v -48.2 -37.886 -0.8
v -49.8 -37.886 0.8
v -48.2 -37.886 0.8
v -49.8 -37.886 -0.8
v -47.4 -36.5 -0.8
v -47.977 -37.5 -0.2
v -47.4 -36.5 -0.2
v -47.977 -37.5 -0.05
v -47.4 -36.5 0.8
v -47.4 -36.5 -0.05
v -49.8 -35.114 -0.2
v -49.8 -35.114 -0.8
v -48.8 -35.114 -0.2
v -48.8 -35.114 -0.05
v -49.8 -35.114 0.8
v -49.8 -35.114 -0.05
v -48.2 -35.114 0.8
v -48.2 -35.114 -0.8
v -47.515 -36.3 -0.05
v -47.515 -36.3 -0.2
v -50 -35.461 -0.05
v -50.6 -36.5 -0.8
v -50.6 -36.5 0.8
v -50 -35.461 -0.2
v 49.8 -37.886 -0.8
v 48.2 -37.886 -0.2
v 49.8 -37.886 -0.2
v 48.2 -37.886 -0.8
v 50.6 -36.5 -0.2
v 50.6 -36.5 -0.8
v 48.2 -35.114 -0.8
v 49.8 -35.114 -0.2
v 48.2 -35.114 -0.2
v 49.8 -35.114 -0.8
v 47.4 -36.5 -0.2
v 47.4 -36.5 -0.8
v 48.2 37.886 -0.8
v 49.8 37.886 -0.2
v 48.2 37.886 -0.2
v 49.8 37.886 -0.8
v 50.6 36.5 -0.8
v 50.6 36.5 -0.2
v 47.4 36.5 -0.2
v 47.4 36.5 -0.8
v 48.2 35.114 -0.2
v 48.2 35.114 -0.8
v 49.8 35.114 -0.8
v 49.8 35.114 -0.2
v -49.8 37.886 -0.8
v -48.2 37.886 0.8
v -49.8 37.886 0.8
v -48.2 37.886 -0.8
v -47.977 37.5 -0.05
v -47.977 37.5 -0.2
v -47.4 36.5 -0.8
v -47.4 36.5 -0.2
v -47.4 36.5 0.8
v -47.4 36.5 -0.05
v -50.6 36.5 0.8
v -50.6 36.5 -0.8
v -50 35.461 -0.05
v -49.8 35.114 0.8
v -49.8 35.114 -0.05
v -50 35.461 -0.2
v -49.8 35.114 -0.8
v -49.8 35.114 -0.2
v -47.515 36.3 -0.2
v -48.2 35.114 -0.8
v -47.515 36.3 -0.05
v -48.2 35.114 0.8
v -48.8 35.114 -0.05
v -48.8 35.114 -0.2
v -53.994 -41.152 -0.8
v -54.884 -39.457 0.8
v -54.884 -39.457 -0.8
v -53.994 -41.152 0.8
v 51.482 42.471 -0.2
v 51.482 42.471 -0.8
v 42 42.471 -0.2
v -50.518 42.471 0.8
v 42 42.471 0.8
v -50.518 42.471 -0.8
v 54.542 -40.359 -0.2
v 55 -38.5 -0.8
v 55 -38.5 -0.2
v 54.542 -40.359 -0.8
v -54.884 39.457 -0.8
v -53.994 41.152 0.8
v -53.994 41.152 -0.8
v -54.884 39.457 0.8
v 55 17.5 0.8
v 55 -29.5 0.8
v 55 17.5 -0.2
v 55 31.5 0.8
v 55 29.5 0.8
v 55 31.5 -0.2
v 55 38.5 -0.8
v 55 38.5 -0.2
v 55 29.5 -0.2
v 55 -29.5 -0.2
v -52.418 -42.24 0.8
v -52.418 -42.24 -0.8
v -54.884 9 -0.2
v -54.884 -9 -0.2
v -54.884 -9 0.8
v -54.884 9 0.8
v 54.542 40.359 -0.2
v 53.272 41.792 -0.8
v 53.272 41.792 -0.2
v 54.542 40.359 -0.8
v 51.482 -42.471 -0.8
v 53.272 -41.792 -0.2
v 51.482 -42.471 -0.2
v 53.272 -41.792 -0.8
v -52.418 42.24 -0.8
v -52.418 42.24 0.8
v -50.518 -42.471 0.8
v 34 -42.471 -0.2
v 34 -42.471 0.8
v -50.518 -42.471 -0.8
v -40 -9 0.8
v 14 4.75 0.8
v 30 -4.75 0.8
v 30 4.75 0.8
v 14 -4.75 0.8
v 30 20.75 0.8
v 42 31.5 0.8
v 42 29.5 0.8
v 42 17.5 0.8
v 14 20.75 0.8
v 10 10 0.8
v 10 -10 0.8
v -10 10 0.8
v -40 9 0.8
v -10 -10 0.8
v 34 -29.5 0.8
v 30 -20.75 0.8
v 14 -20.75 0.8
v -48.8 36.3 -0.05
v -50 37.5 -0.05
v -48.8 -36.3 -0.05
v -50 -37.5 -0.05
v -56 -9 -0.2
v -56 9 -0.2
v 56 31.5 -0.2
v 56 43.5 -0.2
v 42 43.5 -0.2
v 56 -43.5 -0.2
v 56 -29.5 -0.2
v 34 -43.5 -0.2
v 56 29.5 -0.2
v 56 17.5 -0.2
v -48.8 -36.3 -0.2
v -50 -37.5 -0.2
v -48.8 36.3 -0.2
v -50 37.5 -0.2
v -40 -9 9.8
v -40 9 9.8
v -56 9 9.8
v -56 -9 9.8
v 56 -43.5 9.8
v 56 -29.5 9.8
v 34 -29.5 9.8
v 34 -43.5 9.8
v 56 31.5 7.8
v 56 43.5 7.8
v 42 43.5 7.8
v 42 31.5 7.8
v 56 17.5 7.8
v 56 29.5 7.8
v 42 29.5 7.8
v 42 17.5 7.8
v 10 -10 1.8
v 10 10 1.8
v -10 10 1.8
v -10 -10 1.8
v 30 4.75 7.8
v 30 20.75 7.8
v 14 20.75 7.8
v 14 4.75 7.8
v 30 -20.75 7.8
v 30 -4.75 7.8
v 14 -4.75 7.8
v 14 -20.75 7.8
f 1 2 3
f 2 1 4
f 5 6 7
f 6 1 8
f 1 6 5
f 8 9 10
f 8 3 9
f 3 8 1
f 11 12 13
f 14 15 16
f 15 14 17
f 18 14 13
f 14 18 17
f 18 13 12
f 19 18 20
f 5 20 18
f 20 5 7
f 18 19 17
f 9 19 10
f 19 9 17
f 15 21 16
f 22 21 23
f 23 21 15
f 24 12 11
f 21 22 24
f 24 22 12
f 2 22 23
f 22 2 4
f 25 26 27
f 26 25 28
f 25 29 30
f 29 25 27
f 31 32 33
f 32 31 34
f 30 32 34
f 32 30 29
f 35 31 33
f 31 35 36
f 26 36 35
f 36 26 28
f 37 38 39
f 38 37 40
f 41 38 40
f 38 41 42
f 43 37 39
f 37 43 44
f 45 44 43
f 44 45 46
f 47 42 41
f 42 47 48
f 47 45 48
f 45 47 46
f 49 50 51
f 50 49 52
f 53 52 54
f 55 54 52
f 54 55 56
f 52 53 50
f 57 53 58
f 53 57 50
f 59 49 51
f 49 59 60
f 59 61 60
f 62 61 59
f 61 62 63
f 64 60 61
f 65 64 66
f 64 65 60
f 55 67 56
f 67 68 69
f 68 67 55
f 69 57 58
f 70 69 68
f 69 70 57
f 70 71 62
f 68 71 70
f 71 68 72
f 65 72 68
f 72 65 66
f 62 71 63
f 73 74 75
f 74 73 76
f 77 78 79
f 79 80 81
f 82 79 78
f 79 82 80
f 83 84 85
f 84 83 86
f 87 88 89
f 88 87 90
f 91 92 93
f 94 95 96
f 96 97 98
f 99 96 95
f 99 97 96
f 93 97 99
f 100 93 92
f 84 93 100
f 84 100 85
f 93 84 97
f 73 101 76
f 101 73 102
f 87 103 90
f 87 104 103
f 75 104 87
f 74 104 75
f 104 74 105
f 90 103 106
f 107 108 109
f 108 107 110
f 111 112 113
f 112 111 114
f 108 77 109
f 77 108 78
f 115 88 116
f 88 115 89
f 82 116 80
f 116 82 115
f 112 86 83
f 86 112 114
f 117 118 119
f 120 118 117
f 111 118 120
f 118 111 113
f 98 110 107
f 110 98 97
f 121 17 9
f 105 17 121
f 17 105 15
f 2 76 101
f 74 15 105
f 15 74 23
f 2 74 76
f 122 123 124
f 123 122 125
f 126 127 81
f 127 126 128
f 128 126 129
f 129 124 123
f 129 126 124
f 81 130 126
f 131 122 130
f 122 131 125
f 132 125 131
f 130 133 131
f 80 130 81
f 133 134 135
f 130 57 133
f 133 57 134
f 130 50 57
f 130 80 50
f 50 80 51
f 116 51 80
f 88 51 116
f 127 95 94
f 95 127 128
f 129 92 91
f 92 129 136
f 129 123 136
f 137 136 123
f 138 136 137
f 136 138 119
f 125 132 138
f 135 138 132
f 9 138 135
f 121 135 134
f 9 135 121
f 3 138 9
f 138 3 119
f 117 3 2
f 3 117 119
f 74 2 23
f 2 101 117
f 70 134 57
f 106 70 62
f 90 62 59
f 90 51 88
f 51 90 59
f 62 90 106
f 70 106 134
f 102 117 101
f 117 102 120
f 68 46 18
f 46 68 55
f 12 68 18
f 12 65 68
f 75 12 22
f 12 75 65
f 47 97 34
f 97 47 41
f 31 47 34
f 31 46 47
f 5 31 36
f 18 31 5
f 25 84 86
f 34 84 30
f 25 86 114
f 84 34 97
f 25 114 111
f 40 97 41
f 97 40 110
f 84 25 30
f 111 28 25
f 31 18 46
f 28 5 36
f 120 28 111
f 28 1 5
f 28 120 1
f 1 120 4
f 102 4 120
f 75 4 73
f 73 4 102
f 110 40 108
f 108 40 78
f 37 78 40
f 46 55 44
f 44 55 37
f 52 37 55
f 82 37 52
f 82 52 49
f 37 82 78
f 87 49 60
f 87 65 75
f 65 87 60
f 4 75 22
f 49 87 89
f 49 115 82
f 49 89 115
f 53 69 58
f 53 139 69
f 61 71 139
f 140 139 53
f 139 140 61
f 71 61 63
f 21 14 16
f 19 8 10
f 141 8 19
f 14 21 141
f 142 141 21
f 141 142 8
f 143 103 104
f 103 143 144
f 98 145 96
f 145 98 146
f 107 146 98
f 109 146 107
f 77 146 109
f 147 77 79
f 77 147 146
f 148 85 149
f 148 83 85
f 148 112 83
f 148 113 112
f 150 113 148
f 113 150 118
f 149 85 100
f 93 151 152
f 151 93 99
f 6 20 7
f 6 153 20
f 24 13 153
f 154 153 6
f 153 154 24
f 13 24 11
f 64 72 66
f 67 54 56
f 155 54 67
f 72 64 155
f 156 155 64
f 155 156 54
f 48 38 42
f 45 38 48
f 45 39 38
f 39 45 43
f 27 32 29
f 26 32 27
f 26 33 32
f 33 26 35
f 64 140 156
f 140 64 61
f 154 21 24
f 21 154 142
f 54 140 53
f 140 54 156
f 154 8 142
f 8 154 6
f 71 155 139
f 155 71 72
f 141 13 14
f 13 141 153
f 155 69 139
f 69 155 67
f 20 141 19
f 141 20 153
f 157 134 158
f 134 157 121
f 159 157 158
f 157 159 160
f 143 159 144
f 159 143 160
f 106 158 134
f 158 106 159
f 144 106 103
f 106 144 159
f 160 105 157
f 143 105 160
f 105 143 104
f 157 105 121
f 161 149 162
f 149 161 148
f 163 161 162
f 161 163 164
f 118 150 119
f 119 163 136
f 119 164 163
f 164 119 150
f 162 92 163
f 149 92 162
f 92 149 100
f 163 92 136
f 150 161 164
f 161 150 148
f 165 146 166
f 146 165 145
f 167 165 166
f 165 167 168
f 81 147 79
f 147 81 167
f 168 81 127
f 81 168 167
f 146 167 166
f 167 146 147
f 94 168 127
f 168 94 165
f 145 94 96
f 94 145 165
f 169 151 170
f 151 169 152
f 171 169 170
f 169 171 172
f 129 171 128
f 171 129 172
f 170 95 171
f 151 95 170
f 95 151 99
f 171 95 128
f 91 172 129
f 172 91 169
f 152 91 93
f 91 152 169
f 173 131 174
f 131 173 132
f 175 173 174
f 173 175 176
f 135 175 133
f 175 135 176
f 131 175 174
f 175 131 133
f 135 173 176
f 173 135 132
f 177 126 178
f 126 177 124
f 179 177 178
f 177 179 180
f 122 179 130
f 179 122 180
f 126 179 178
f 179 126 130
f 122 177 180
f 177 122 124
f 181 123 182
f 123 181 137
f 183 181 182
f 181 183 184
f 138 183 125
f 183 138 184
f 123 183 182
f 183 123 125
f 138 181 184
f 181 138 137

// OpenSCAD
// Parameters
pcb_length = 110.0; //[55.0:220.0:1]
pcb_width = 85.0; //[42.5:170.0:1]
pcb_thickness = 1.6; //[0.8:3.2:0.1]
corner_radius = 4.0; //[2.0:8.0:0.5]
mount_hole_diameter = 3.2; //[2.0:6.0:0.1]
mount_hole_edge_offset = 6.0; //[3.0:12.0:0.5]
hole_clearance_z = 0.4; //[0.1:1.0:0.1]
overlap = 1.0; //[0.5:2.0:0.1]
silkscreen_thickness = 0.15; //[0.05:0.4:0.05]
silkscreen_margin = 5.0; //[2.0:12.0:0.5]
silkscreen_frame_width = 1.2; //[0.6:3.0:0.1]
connector_height = 10.0; //[5.0:20.0:0.5]
connector_wall = 2.0; //[1.0:4.0:0.5]
heatsink_height = 8.0; //[4.0:16.0:0.5]
chip_height = 2.0; //[1.0:5.0:0.1]

// Base Shapes
module pcb_corner_cyl(pos) {
  translate(pos)
    cylinder(r=corner_radius, h=pcb_thickness, center=true);
}

module mount_hole(pos) {
  translate(pos)
    cylinder(r=mount_hole_diameter/2, h=pcb_thickness + hole_clearance_z, center=true);
}

module silkscreen_outer_plate() {
  translate([0, 0, pcb_thickness/2 + silkscreen_thickness/2 - overlap])
    cube([pcb_length - 2*silkscreen_margin, pcb_width - 2*silkscreen_margin, silkscreen_thickness], center=true);
}

module silkscreen_inner_cut() {
  translate([0, 0, pcb_thickness/2 + silkscreen_thickness/2 - overlap])
    cube([pcb_length - 2*(silkscreen_margin + silkscreen_frame_width), pcb_width - 2*(silkscreen_margin + silkscreen_frame_width), silkscreen_thickness + 2*overlap], center=true);
}

module connector_usb() {
  translate([-pcb_length/2 + (12 + 2*connector_wall)/2 - overlap, 0, pcb_thickness/2 + connector_height/2 - overlap])
    cube([12 + 2*connector_wall, 14 + 2*connector_wall, connector_height], center=true);
}

module connector_power() {
  translate([pcb_length/2 - (18 + 2*connector_wall)/2 + overlap, -pcb_width/2 + (10 + 2*connector_wall)/2 - overlap, pcb_thickness/2 + connector_height/2 - overlap])
    cube([18 + 2*connector_wall, 10 + 2*connector_wall, connector_height], center=true);
}

module connector_stepper(pos) {
  translate(pos)
    cube([10 + 2*connector_wall, 8 + 2*connector_wall, connector_height*0.8], center=true);
}

module chip(pos, size) {
  translate(pos)
    cube(size, center=true);
}

module heatsink(pos) {
  translate(pos)
    cube([16, 16, heatsink_height], center=true);
}

// Operations
module board_corner_radius() {
  hull() {
    pcb_corner_cyl([pcb_length/2 - corner_radius, pcb_width/2 - corner_radius, 0]);
    pcb_corner_cyl([-pcb_length/2 + corner_radius, pcb_width/2 - corner_radius, 0]);
    pcb_corner_cyl([-pcb_length/2 + corner_radius, -pcb_width/2 + corner_radius, 0]);
    pcb_corner_cyl([pcb_length/2 - corner_radius, -pcb_width/2 + corner_radius, 0]);
  }
}

module mounting_holes() {
  union() {
    mount_hole([-pcb_length/2 + mount_hole_edge_offset, -pcb_width/2 + mount_hole_edge_offset, 0]);
    mount_hole([pcb_length/2 - mount_hole_edge_offset, -pcb_width/2 + mount_hole_edge_offset, 0]);
    mount_hole([pcb_length/2 - mount_hole_edge_offset, pcb_width/2 - mount_hole_edge_offset, 0]);
    mount_hole([-pcb_length/2 + mount_hole_edge_offset, pcb_width/2 - mount_hole_edge_offset, 0]);
  }
}

module pcb_main_body() {
  difference() {
    board_corner_radius();
    mounting_holes();
  }
}

module silkscreen_markings() {
  difference() {
    silkscreen_outer_plate();
    silkscreen_inner_cut();
  }
}

module connectors() {
  union() {
    connector_usb();
    connector_power();
    connector_stepper([pcb_length/2 - (10 + 2*connector_wall)/2 + overlap, pcb_width/2 - (8 + 2*connector_wall)/2 + overlap, pcb_thickness/2 + (connector_height*0.8)/2 - overlap]);
    connector_stepper([pcb_length/2 - (10 + 2*connector_wall)/2 + overlap, pcb_width/2 - (8 + 2*connector_wall)/2 - (8 + 2*connector_wall) - overlap, pcb_thickness/2 + (connector_height*0.8)/2 - overlap]);
  }
}

module chips_components() {
  union() {
    chip([0, 0, pcb_thickness/2 + chip_height/2 - overlap], [20, 20, chip_height]);
    chip([pcb_length*0.2, pcb_width*0.15, pcb_thickness/2 + chip_height/2 - overlap], [12, 12, chip_height]);
    chip([pcb_length*0.2, -pcb_width*0.15, pcb_thickness/2 + chip_height/2 - overlap], [12, 12, chip_height]);
  }
}

module heatsinks() {
  union() {
    heatsink([pcb_length*0.2, pcb_width*0.15, pcb_thickness/2 + heatsink_height/2 - overlap]);
    heatsink([pcb_length*0.2, -pcb_width*0.15, pcb_thickness/2 + heatsink_height/2 - overlap]);
  }
}

// Final Output
module mainboard_complete() {
  union() {
    pcb_main_body();
    silkscreen_markings();
    connectors();
    chips_components();
    heatsinks();
  }
}

// Render the complete mainboard
color([0.0, 0.4, 0.2]) mainboard_complete(); // PCB color
